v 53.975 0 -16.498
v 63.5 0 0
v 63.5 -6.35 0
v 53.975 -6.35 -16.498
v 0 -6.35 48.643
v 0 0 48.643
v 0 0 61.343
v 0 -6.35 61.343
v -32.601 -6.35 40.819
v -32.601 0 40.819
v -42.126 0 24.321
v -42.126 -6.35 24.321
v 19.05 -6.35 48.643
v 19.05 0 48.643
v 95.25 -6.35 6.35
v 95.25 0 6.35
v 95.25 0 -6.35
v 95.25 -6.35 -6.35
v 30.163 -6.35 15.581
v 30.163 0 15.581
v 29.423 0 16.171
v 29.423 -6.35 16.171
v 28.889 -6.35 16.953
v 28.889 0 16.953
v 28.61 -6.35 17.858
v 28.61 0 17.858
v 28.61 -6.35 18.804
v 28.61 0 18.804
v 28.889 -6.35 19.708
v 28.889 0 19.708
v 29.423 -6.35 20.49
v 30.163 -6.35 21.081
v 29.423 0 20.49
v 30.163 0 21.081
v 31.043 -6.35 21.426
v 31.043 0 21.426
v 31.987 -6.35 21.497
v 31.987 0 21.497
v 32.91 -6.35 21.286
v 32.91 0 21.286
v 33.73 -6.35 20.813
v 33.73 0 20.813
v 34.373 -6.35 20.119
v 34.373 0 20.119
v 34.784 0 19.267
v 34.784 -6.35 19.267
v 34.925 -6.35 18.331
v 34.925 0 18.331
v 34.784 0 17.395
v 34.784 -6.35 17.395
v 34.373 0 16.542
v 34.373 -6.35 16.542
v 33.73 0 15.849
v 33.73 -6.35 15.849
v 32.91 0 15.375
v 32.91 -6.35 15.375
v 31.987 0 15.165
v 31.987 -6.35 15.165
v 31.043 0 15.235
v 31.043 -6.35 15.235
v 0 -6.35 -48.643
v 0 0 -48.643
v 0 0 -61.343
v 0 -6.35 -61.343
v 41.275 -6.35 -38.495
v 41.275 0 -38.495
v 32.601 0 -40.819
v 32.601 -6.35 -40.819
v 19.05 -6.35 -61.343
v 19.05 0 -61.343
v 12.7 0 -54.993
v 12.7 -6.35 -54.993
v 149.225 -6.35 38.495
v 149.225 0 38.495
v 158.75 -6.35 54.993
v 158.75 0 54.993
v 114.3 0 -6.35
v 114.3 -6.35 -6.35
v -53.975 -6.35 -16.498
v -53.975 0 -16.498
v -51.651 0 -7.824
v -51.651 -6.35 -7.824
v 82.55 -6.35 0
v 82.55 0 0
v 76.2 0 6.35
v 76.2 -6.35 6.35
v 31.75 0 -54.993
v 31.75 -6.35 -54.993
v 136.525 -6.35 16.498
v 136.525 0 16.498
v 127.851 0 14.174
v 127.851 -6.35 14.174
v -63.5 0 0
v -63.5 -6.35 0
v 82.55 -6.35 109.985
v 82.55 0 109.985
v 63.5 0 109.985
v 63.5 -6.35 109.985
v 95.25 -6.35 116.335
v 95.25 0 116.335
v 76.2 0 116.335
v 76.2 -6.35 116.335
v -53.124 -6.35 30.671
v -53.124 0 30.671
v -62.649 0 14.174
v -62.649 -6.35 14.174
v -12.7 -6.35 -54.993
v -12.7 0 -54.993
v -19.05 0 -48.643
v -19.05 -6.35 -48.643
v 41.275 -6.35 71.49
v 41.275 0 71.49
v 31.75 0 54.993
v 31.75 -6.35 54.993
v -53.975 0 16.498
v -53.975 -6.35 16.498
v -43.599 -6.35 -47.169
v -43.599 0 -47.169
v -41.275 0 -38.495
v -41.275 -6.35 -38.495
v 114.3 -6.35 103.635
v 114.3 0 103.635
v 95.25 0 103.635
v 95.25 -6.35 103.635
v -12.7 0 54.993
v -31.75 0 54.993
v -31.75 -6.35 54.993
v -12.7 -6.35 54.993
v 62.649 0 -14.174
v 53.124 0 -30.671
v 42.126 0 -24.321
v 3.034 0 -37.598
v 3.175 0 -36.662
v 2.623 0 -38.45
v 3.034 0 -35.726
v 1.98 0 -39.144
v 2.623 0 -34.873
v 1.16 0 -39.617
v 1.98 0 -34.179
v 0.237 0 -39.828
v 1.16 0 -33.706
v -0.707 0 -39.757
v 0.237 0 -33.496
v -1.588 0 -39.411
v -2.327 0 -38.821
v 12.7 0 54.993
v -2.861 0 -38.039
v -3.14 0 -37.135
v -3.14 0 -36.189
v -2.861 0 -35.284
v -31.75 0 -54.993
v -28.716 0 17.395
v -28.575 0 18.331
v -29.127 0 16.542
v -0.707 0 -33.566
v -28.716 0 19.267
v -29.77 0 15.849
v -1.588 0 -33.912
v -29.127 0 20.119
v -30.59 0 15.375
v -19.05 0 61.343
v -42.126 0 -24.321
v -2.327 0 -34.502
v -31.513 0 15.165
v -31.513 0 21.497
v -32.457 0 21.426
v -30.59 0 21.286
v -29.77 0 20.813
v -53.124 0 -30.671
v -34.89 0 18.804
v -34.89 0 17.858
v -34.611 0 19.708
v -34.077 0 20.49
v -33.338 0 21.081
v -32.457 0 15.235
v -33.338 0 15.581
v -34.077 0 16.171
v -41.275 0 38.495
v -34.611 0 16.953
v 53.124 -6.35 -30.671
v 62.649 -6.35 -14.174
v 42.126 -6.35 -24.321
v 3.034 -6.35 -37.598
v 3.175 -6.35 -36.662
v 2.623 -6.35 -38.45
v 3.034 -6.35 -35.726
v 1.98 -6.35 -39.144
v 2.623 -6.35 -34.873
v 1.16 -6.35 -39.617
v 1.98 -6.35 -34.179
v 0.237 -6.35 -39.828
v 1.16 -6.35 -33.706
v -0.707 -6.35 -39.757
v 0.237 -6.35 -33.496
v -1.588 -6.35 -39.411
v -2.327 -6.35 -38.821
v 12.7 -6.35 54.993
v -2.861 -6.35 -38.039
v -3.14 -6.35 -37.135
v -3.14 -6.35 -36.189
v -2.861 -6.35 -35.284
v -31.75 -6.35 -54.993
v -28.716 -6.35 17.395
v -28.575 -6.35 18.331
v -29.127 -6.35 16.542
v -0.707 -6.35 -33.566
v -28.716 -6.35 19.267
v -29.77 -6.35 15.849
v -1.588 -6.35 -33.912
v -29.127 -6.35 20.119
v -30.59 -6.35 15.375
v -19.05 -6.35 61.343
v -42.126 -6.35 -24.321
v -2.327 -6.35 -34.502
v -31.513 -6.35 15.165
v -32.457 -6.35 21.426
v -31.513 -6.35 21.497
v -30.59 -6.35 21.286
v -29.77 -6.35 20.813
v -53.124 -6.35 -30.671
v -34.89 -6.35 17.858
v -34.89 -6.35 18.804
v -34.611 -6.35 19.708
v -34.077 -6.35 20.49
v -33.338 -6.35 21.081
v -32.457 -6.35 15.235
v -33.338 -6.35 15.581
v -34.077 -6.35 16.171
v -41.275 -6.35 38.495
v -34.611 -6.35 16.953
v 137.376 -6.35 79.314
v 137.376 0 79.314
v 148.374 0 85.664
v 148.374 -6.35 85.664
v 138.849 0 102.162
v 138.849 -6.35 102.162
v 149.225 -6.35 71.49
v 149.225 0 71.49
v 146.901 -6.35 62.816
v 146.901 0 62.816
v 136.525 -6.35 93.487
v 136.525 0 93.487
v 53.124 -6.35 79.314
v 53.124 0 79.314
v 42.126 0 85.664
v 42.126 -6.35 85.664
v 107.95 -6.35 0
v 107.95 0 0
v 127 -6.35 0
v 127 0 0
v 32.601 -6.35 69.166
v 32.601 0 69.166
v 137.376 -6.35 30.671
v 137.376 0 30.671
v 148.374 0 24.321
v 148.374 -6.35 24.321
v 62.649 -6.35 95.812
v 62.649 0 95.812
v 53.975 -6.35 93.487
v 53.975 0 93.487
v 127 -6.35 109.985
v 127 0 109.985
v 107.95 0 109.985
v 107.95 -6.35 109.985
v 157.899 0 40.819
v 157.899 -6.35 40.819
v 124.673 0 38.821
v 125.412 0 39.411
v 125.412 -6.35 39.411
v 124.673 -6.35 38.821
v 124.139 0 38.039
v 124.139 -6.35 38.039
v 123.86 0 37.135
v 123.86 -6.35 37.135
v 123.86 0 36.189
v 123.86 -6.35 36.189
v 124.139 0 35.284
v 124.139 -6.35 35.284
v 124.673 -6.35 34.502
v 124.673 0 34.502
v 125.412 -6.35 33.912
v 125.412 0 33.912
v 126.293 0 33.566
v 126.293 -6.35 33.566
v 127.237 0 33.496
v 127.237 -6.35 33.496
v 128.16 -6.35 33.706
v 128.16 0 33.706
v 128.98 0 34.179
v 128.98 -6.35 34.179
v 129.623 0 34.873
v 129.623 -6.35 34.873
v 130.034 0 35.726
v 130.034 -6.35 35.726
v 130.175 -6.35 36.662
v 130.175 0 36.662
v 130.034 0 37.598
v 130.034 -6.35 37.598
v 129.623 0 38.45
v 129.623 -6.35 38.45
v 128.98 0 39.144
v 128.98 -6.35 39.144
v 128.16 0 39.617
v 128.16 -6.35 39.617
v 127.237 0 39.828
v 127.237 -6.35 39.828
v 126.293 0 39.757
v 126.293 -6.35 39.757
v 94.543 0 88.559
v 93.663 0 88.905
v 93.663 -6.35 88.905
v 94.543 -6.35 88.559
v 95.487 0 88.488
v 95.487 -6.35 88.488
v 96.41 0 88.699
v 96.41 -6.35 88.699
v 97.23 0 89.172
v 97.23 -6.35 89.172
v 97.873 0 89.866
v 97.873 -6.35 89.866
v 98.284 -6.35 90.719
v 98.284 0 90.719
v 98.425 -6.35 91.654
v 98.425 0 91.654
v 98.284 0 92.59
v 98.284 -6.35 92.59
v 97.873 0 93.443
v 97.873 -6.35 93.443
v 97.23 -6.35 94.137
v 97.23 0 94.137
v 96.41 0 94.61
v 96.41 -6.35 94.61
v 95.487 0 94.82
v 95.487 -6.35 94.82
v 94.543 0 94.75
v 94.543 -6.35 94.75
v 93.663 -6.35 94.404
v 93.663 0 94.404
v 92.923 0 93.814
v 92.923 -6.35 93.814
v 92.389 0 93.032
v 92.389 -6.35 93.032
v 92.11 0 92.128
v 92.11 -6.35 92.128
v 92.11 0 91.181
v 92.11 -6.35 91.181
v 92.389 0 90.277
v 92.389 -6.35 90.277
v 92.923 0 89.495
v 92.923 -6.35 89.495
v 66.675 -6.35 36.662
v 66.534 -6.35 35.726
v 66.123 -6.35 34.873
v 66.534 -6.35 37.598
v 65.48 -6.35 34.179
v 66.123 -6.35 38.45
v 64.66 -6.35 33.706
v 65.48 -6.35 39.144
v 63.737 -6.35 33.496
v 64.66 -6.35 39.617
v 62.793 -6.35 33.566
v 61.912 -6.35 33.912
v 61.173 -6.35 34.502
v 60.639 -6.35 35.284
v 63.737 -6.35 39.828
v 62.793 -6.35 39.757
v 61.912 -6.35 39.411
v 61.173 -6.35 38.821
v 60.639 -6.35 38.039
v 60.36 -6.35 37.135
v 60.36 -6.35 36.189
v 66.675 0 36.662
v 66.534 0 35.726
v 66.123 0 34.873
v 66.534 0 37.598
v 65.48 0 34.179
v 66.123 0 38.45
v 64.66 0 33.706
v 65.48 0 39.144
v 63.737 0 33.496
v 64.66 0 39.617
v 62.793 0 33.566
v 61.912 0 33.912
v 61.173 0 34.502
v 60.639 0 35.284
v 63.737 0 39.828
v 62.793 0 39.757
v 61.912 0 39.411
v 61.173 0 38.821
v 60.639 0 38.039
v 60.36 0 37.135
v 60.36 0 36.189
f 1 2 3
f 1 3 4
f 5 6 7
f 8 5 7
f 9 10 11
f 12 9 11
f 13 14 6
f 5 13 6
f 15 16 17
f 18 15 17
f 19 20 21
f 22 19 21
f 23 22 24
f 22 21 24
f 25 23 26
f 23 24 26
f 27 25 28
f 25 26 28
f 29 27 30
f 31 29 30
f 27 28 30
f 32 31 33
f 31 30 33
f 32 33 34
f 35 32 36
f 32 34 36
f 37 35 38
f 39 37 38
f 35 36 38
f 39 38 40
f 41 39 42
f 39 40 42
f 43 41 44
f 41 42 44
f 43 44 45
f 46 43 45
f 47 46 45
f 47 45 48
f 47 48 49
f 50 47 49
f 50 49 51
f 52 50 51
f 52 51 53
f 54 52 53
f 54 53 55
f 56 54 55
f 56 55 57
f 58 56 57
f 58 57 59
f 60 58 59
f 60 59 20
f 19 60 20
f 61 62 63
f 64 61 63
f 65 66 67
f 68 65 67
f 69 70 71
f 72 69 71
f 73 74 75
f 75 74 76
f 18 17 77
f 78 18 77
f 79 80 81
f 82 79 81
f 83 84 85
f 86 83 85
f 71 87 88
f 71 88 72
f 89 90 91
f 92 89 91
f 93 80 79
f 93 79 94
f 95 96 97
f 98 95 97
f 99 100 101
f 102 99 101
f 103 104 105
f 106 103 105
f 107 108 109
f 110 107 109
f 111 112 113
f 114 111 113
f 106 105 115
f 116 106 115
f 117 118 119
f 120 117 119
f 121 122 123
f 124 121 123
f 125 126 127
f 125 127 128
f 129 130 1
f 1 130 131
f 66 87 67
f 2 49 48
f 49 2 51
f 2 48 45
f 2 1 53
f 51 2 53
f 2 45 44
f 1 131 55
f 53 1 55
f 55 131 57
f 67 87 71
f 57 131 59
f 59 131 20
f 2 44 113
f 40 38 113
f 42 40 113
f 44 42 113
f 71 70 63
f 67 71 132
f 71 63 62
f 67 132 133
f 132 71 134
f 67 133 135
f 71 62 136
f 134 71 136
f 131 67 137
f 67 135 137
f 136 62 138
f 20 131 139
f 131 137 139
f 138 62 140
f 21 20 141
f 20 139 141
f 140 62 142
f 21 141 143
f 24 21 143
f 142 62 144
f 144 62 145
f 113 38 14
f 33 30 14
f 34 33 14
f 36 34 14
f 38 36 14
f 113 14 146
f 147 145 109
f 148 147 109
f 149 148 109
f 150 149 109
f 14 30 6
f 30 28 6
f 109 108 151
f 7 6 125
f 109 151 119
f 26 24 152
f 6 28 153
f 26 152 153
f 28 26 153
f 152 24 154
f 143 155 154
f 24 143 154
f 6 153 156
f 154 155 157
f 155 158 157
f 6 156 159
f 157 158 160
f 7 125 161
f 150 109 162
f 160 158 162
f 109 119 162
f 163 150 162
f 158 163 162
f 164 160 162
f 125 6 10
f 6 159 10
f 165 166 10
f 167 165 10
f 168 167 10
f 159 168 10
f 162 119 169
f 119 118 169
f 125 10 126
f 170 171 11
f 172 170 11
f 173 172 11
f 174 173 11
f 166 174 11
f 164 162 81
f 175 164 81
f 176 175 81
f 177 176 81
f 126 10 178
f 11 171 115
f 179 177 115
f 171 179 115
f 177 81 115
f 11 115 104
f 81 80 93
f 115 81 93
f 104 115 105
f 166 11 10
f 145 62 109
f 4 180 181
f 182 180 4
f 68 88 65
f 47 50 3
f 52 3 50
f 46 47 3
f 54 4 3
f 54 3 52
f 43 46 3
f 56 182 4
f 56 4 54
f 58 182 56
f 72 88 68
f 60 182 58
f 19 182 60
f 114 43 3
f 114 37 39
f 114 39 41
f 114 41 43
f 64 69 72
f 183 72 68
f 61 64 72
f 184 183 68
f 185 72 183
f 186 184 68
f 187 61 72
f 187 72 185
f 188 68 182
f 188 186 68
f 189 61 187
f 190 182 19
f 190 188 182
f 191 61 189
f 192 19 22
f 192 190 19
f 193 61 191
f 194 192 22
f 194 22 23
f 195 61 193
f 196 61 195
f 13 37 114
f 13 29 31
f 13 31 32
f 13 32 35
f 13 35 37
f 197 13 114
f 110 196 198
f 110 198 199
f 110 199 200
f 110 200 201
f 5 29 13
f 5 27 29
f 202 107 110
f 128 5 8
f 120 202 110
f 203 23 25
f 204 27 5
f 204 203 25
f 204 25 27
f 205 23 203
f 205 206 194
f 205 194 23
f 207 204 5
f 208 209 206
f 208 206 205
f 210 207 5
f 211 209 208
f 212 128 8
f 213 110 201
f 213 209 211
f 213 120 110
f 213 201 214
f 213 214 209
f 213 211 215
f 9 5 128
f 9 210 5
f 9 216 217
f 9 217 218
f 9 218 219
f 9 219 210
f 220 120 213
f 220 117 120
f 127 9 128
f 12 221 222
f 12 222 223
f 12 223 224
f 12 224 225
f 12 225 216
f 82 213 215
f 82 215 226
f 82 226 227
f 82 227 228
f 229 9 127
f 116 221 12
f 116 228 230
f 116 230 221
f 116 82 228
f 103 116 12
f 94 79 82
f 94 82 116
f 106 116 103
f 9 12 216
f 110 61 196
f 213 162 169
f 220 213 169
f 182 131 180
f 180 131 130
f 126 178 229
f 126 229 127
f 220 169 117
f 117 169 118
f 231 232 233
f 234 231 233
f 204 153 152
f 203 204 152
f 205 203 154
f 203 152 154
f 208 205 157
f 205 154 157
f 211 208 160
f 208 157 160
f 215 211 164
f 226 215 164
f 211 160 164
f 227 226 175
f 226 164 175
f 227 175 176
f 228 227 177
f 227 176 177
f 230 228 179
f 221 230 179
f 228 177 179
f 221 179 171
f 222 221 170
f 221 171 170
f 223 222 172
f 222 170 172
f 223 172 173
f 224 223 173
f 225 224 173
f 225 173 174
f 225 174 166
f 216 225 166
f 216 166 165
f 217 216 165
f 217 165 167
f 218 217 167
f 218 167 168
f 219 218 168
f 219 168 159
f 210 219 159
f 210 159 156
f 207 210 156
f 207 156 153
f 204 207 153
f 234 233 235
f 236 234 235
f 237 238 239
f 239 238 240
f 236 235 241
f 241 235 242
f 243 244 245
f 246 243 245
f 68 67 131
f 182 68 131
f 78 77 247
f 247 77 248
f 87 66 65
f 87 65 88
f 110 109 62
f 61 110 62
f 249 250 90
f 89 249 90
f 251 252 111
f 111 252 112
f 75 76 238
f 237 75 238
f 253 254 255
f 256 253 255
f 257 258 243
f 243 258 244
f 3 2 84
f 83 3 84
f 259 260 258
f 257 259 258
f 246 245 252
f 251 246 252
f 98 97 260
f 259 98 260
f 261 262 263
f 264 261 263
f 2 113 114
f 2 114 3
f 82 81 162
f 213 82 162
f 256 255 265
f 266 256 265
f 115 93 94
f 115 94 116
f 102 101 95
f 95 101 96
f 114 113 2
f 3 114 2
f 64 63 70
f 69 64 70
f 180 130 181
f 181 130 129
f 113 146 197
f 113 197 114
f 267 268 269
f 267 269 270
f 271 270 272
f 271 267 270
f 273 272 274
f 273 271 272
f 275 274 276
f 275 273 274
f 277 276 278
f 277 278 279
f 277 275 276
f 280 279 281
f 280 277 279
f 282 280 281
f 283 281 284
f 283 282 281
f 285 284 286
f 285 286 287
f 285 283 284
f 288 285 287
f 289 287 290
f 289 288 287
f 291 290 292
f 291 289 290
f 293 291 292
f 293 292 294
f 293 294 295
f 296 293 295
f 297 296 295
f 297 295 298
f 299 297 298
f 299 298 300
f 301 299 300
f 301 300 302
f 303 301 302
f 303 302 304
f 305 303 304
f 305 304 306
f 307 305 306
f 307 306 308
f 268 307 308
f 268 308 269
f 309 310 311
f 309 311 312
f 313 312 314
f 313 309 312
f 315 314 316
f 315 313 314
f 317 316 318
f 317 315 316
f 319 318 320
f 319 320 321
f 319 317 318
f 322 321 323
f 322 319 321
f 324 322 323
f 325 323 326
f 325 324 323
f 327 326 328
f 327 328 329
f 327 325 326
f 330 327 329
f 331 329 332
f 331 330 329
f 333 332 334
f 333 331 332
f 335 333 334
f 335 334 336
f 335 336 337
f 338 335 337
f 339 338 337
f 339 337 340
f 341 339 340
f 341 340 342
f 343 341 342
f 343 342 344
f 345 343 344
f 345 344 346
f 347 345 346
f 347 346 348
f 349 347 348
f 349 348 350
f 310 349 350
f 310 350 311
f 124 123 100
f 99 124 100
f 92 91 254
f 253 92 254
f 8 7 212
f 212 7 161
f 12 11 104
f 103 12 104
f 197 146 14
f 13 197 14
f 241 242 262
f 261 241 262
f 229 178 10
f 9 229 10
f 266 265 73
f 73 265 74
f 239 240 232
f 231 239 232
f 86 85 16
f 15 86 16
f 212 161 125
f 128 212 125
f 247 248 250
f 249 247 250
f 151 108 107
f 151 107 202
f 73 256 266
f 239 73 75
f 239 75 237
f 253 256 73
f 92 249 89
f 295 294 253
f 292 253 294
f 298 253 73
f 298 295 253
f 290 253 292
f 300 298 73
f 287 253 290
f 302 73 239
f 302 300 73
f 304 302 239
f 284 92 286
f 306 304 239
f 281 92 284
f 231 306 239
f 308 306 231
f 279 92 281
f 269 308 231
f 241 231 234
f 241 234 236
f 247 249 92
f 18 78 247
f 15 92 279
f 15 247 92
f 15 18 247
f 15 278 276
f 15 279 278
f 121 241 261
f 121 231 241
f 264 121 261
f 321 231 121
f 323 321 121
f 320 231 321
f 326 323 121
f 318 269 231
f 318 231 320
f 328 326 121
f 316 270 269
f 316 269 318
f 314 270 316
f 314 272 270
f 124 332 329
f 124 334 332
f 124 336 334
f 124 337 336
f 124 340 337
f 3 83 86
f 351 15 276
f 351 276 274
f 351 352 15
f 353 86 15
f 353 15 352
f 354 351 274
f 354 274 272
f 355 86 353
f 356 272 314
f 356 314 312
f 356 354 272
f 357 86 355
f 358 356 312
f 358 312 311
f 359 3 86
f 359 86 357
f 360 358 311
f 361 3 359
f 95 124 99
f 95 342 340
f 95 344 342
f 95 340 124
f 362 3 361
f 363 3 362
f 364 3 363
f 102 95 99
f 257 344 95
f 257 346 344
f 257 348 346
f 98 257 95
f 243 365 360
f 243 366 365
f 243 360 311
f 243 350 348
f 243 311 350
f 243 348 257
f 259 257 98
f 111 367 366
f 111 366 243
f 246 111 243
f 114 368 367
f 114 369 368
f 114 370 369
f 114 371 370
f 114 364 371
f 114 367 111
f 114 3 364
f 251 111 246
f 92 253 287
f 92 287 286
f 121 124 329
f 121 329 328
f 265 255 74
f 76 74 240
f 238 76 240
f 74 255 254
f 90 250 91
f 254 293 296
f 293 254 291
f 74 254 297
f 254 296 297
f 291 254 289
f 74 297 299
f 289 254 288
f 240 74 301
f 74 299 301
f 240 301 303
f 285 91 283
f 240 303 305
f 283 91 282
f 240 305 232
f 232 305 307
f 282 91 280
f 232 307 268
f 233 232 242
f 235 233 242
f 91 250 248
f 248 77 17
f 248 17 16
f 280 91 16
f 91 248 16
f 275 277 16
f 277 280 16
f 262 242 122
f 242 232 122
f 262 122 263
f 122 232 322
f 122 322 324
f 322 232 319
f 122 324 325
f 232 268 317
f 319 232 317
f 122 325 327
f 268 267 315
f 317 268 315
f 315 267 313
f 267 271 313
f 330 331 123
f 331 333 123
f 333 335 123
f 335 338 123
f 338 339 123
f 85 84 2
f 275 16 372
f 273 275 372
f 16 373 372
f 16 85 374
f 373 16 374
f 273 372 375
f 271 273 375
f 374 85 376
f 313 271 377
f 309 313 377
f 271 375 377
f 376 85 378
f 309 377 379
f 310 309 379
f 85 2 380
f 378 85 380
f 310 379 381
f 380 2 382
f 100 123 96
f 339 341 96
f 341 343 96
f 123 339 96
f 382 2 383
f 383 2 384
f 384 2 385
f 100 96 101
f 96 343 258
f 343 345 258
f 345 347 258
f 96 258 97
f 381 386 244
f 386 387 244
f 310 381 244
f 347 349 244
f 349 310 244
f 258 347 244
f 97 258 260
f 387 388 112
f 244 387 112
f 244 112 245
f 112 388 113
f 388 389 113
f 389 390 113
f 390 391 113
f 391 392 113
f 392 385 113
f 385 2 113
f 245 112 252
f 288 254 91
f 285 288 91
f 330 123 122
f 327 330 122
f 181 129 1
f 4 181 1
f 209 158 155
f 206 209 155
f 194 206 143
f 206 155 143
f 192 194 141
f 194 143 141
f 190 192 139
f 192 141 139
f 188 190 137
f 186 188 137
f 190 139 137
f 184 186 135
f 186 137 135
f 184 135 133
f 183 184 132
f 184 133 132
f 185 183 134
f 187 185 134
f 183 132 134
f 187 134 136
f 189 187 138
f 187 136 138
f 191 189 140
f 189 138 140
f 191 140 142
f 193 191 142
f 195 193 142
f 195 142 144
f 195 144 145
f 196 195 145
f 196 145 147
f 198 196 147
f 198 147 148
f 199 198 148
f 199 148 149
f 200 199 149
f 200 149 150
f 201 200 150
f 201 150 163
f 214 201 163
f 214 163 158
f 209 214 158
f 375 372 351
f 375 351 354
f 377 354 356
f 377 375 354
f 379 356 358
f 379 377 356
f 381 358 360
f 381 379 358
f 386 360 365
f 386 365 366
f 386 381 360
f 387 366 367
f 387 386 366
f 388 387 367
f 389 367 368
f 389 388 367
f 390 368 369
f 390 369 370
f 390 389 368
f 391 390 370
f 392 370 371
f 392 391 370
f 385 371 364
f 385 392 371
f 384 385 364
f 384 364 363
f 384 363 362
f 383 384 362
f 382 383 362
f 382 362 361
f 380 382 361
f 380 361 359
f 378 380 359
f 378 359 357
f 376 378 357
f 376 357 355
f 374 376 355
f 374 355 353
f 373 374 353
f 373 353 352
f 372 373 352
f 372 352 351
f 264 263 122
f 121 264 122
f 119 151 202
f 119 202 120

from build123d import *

# Parameters (mm, degrees)
BOSS_EXTRUDE1_DEPTH = 6.35
SKETCH9_R           = 3.175
CUT_EXTRUDE3_DEPTH  = 85.242269675
CIRPATTERN6_COUNT   = 3
CUT_EXTRUDE4_DEPTH  = 194.232075495
BOSS_EXTRUDE4_DEPTH = 6.35
CIRPATTERN7_COUNT   = 6
CUT_EXTRUDE5_DEPTH  = 194.232075495
BOSS_EXTRUDE5_DEPTH = 6.35
CIRPATTERN8_COUNT   = 6


with BuildPart() as part:
    # Sketch1 → Boss-Extrude1 (new body)
    with BuildSketch(Plane(origin=(0, 0, 0), x_dir=(1, 0, 0), z_dir=(0, 1, 0))):
        Polygon((63.5, 0), (31.75, 54.99261314), (-31.75, 54.99261314), (-63.5, 0), (-31.75, -54.99261314), (31.75, -54.99261314), align=None)
    extrude(amount=-BOSS_EXTRUDE1_DEPTH)

    # Sketch9 → Cut-Extrude3 (cut, through all)
    with BuildSketch(Plane(origin=(0, 0, 0), x_dir=(1, 0, 0), z_dir=(0, 1, 0))):
        with Locations((-31.75, -18.330871047)):
            Circle(SKETCH9_R)
    cut_extrude3 = extrude(amount=-CUT_EXTRUDE3_DEPTH, mode=Mode.SUBTRACT)

    # CirPattern6: Cut-Extrude3 ×3 about axis
    cirpattern6_axis = Axis((0, 0, 0), (0, 1, 0))
    for i in range(1, CIRPATTERN6_COUNT):
        add(cut_extrude3.rotate(cirpattern6_axis, i * 360 / CIRPATTERN6_COUNT), mode=Mode.SUBTRACT)


with BuildPart() as body_2:
    # Mirror3: mirrored copy
    add(part.part.mirror(Plane(origin=(31.75, -6.35, 54.99261314), x_dir=(-0.4999999999999997, 0, 0.8660254037844387), z_dir=(0.8660254037844387, 0, 0.49999999999999983))))

    # Sketch13 → Cut-Extrude5 (cut, through all)
    with BuildSketch(Plane(origin=(0, 0, 0), x_dir=(1, 0, 0), z_dir=(0, 1, 0))):
        Polygon((136.525, -16.497783942), (127.850738686, -14.173522628), (137.375738686, -30.67130657), (142.875, -27.49630657), align=None)
    cut_extrude5 = extrude(amount=-CUT_EXTRUDE5_DEPTH, mode=Mode.SUBTRACT)

    # Sketch14 → Boss-Extrude5 (add)
    with BuildSketch(Plane(origin=(0, 0, 0), x_dir=(1, 0, 0), z_dir=(0, 1, 0))):
        Polygon((142.875, -27.49630657), (148.374261314, -24.32130657), (157.899261314, -40.819090512), (149.225, -38.494829198), align=None)
    boss_extrude5 = extrude(amount=-BOSS_EXTRUDE5_DEPTH)

    # CirPattern8: Cut-Extrude5, Boss-Extrude5 ×6 about axis, 1 skipped
    cirpattern8_axis = Axis((95.25, 0, 54.99261314), (0, 1, 0))
    add([cut_extrude5.rotate(cirpattern8_axis, i * 360 / CIRPATTERN8_COUNT) for i in range(1, CIRPATTERN8_COUNT) if i not in (2,)], mode=Mode.SUBTRACT)
    add([boss_extrude5.rotate(cirpattern8_axis, i * 360 / CIRPATTERN8_COUNT) for i in range(1, CIRPATTERN8_COUNT) if i not in (2,)])


with BuildPart() as part_1:
    add(part.part)

    # Sketch10 → Cut-Extrude4 (cut, through all)
    with BuildSketch(Plane(origin=(0, 0, 0), x_dir=(1, 0, 0), z_dir=(0, 1, 0))):
        Polygon((41.275, 38.494829198), (32.600738686, 40.819090512), (42.125738686, 24.32130657), (47.625, 27.49630657), align=None)
    cut_extrude4 = extrude(amount=-CUT_EXTRUDE4_DEPTH, mode=Mode.SUBTRACT)

    # Sketch11 → Boss-Extrude4 (add)
    with BuildSketch(Plane(origin=(0, 0, 0), x_dir=(1, 0, 0), z_dir=(0, 1, 0))):
        Polygon((47.625, 27.49630657), (53.124261314, 30.67130657), (62.649261314, 14.173522628), (53.975, 16.497783942), align=None)
    boss_extrude4 = extrude(amount=-BOSS_EXTRUDE4_DEPTH)

    # CirPattern7: Cut-Extrude4, Boss-Extrude4 ×6 about axis, 1 skipped
    cirpattern7_axis = Axis((0, 0, 0), (0, 1, 0))
    add([cut_extrude4.rotate(cirpattern7_axis, i * 360 / CIRPATTERN7_COUNT) for i in range(1, CIRPATTERN7_COUNT) if i not in (5,)], mode=Mode.SUBTRACT)
    add([boss_extrude4.rotate(cirpattern7_axis, i * 360 / CIRPATTERN7_COUNT) for i in range(1, CIRPATTERN7_COUNT) if i not in (5,)])


solid = Compound([body_2.part, part_1.part])
